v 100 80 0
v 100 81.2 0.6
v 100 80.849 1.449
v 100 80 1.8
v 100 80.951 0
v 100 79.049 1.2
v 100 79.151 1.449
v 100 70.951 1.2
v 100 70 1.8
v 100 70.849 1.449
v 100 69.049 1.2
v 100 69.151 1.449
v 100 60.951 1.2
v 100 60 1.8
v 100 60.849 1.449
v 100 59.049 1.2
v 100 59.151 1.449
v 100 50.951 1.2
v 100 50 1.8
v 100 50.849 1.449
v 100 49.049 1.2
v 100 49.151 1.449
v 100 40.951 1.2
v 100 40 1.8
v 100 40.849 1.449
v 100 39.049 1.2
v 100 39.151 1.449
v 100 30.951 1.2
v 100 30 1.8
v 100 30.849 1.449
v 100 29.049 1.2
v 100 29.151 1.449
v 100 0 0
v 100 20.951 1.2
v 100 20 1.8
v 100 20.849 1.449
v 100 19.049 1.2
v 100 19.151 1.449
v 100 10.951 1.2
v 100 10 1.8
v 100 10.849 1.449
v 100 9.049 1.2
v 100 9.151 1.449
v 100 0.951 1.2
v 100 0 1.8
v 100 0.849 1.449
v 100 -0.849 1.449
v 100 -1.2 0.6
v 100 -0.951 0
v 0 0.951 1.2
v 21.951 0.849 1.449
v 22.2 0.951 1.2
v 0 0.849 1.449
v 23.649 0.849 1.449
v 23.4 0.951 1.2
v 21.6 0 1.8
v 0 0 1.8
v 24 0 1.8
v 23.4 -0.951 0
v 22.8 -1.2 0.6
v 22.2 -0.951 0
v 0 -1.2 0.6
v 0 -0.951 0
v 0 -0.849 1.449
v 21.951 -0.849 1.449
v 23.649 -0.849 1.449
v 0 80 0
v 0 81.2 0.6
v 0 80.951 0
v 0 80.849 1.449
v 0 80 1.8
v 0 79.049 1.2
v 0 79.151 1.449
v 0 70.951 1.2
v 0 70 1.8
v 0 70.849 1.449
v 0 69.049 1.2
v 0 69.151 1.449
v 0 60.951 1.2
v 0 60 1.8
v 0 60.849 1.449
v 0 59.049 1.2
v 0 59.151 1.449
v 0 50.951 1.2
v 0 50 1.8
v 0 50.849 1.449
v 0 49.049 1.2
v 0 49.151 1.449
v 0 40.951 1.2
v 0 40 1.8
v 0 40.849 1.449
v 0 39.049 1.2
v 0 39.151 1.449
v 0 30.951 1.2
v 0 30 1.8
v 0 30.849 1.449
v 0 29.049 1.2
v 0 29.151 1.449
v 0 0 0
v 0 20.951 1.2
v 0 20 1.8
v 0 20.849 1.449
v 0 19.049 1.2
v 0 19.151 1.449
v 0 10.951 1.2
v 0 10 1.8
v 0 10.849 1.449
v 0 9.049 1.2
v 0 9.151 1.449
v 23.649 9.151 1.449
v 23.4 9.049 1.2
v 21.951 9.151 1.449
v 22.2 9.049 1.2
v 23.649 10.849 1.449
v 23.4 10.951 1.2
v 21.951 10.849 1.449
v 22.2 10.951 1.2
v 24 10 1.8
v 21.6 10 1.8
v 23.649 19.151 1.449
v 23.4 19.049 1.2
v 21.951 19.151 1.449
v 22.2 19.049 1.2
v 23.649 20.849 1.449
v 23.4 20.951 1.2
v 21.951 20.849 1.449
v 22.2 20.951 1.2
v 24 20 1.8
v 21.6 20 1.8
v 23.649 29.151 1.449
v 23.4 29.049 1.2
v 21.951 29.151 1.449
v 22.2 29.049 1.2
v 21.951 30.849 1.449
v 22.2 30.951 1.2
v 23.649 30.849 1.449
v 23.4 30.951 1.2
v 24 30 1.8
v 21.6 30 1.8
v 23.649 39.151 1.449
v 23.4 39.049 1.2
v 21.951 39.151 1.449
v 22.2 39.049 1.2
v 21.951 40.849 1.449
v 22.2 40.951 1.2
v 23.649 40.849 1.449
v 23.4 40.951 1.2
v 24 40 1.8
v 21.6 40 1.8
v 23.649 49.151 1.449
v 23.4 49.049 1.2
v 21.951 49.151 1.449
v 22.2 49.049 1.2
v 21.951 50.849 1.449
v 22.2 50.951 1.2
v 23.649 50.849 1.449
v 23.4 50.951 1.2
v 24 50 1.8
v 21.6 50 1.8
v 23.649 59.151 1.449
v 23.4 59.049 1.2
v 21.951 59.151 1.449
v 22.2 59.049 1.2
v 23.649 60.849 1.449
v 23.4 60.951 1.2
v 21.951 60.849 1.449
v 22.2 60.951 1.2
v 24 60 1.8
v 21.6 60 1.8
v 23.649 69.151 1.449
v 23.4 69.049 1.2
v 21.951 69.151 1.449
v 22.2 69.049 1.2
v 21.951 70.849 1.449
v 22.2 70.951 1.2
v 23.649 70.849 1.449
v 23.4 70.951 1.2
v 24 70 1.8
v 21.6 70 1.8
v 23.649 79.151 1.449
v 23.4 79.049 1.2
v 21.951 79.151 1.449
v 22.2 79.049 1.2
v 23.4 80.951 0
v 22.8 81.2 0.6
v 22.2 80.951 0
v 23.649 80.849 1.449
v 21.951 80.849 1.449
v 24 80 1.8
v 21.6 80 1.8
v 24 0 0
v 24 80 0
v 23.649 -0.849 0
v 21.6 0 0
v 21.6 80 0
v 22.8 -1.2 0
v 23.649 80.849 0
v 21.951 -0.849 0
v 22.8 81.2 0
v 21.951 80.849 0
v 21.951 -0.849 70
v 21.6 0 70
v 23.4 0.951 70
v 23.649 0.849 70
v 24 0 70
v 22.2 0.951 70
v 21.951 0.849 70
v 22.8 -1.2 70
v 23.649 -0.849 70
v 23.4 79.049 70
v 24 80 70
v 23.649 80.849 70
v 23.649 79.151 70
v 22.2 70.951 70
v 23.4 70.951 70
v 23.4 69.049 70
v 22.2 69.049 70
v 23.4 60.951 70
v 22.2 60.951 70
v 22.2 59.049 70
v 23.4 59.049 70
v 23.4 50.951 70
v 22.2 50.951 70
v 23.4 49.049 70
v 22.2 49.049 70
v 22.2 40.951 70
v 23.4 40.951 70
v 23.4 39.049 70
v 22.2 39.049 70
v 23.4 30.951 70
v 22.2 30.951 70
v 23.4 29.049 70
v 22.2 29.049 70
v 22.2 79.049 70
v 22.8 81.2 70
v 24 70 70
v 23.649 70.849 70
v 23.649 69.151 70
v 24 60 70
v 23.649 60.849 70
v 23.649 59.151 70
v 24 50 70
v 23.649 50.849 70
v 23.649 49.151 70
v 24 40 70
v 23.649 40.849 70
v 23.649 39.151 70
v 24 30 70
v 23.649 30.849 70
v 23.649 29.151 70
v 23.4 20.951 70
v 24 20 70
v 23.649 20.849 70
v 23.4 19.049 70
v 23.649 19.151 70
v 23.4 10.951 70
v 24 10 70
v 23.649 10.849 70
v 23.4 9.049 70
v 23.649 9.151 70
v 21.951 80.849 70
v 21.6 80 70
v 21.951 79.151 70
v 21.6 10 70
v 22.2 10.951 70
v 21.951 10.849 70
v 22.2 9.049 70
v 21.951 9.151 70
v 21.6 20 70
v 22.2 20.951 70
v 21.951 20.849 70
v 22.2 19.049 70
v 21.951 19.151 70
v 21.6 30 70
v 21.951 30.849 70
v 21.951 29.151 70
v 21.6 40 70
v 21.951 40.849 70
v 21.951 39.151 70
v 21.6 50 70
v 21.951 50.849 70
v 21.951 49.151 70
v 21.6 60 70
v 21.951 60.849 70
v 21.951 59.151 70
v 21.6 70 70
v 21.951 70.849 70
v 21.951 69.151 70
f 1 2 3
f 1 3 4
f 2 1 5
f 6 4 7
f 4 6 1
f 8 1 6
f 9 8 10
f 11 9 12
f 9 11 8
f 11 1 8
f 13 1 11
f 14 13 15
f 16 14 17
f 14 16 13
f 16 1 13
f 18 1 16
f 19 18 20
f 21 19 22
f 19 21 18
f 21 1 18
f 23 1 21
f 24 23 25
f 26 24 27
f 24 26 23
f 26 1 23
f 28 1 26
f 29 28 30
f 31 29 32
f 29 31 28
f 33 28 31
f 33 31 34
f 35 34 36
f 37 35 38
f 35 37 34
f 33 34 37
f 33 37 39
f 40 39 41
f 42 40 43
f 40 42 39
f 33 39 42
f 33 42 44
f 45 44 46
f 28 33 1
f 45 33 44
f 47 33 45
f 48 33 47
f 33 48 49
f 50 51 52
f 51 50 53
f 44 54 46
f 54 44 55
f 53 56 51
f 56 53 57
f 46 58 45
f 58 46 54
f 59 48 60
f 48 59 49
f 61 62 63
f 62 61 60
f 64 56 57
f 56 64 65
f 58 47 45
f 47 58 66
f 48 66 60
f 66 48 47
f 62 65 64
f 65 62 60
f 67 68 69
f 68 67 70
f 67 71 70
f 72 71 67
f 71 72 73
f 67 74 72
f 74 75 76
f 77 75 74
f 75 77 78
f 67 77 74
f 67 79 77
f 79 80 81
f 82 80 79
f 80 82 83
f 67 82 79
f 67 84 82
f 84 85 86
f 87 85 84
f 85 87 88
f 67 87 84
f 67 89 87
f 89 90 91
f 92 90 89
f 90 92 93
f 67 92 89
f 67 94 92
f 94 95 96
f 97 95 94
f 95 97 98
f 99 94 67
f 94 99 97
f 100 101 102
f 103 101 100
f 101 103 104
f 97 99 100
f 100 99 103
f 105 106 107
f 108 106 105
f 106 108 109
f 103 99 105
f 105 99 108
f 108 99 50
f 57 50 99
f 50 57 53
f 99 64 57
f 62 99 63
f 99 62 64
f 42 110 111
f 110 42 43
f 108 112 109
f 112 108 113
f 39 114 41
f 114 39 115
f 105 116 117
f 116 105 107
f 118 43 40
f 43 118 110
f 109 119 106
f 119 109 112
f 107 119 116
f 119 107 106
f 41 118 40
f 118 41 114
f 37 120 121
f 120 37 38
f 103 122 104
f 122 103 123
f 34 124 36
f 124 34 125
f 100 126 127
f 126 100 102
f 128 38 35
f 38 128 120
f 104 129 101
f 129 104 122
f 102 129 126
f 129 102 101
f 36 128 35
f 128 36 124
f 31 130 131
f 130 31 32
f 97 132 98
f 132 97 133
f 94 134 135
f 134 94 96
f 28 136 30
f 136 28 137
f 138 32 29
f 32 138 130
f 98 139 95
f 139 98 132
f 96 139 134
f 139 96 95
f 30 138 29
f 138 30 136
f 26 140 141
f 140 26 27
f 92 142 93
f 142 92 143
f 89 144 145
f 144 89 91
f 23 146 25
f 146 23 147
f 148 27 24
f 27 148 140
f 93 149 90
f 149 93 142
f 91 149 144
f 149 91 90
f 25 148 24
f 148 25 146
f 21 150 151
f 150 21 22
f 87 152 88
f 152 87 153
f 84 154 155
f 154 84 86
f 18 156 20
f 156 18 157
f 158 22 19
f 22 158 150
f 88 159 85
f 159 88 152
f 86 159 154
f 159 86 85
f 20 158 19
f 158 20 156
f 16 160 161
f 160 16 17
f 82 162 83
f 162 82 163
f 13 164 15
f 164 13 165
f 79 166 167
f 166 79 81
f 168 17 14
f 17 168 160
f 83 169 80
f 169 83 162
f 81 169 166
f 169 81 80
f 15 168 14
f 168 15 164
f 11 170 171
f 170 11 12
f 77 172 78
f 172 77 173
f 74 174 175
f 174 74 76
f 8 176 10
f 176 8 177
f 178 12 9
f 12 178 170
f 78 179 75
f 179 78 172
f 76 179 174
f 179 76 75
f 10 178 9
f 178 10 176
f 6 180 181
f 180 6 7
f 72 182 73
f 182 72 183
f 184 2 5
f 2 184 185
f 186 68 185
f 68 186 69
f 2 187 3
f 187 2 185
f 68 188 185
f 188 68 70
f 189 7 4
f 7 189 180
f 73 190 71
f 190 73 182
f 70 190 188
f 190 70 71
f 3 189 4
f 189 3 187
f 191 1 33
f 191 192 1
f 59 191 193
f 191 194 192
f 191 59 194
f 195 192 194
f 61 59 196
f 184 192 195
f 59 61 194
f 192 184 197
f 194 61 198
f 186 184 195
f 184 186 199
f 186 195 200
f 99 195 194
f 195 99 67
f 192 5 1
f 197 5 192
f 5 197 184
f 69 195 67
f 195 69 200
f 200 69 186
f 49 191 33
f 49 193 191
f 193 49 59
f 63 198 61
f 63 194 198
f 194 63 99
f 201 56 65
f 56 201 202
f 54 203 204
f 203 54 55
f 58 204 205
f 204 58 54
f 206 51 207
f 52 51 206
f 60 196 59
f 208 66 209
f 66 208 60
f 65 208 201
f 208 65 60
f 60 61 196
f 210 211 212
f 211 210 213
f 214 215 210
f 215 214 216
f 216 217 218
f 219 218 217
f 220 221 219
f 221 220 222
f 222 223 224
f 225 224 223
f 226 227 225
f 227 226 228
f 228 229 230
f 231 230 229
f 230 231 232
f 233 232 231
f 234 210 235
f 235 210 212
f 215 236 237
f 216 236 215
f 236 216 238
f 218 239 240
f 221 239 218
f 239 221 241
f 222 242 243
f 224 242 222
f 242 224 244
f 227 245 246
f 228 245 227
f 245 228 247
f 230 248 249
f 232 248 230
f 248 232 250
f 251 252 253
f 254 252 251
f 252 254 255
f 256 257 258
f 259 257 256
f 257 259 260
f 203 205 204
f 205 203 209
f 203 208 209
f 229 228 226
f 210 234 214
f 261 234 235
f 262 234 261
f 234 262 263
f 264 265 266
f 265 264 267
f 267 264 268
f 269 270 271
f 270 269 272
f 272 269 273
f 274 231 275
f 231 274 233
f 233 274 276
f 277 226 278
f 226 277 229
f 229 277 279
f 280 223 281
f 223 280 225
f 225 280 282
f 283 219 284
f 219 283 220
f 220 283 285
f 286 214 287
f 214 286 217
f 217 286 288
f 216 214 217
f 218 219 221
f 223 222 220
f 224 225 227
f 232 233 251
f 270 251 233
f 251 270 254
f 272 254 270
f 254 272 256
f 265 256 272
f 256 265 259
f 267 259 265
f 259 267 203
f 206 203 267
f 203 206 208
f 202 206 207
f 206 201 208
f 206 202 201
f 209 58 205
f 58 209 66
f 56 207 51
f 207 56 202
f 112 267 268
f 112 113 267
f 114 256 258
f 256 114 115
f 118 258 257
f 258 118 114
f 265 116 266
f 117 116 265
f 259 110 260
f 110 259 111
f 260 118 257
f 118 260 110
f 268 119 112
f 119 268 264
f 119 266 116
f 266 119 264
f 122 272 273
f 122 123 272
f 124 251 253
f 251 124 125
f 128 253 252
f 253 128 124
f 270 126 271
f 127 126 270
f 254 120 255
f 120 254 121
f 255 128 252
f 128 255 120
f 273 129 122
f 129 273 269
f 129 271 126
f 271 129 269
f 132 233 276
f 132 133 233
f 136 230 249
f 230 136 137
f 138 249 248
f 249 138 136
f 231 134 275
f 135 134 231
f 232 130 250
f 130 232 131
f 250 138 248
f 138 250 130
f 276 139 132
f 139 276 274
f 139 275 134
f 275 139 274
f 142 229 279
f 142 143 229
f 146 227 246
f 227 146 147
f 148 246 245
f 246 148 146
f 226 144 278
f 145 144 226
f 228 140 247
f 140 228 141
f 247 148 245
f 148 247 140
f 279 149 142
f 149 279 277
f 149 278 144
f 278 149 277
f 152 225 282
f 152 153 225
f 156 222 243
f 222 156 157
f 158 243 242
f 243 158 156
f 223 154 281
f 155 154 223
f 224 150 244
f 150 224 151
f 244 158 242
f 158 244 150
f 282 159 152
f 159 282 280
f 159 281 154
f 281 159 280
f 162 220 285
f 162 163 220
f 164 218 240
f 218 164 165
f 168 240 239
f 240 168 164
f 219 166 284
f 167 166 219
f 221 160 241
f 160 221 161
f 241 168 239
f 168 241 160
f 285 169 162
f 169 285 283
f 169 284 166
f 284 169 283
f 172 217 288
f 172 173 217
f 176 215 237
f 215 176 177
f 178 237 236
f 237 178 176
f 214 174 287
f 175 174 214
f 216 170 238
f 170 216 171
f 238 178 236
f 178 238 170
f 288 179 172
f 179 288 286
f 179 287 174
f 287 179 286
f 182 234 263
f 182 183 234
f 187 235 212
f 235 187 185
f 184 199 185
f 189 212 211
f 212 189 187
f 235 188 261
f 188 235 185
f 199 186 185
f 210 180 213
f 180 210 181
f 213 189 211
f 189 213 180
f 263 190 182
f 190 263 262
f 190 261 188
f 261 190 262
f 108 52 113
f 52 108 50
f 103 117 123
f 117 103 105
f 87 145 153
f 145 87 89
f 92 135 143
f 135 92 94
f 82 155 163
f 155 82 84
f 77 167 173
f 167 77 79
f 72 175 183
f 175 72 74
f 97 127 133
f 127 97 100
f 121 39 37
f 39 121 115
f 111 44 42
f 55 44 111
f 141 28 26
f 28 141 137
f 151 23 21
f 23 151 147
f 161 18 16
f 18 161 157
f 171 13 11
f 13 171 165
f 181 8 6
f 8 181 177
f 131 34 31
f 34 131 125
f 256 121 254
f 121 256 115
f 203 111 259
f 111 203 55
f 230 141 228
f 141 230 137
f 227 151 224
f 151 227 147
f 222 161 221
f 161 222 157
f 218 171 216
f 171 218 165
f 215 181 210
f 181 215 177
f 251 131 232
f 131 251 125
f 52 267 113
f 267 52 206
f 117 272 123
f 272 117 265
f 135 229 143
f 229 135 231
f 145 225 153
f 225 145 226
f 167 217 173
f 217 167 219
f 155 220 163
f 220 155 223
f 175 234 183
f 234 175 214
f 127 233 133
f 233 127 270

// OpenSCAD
$fn=8;
thickness = 1.2;
length = 100;
ribs = 8; // 10;
width = 80; // 120;
height = 70;
holeDiam = 6;
holeDistance = holeDiam * 1.2;
wallOffset = (3 * holeDistance) + (thickness / 2);
holes = false;


// Base
difference() {
    cube([length, width, thickness]);
    if(holes) {
        for(w = [0 : width / ribs : width]) {
            for(l = [holeDiam : holeDistance : length - holeDiam]) {
                translate([l, w + width / ribs / 2, 0]) cylinder(thickness, d = holeDiam);
            }
        }
    }
}
 
difference() {
    for(variable = [0 : width / ribs : width]) {
        translate([0, variable, thickness / 2]) rotate([0, 90, 0]) cylinder(length, r = thickness);
    }
    translate([0, -thickness, -thickness]) cube([length, width + 2 * thickness, thickness]);
}

    
// Wall
difference() {
    translate([wallOffset, 0, 0]) cube([thickness, width, height]);
    if(holes) {
        for(w = [0 : width / ribs : width]) {
            for(h = [holeDiam : holeDistance : height - holeDiam]) {
                translate([wallOffset, w + width / ribs / 2, h]) rotate([0, 90, 0]) cylinder(thickness, d = holeDiam);
            }
        }
    }
}

for(variable = [0 : width / ribs : width]) {
    translate([wallOffset + thickness / 2, variable, 0]) cylinder(height, r = thickness);
}
